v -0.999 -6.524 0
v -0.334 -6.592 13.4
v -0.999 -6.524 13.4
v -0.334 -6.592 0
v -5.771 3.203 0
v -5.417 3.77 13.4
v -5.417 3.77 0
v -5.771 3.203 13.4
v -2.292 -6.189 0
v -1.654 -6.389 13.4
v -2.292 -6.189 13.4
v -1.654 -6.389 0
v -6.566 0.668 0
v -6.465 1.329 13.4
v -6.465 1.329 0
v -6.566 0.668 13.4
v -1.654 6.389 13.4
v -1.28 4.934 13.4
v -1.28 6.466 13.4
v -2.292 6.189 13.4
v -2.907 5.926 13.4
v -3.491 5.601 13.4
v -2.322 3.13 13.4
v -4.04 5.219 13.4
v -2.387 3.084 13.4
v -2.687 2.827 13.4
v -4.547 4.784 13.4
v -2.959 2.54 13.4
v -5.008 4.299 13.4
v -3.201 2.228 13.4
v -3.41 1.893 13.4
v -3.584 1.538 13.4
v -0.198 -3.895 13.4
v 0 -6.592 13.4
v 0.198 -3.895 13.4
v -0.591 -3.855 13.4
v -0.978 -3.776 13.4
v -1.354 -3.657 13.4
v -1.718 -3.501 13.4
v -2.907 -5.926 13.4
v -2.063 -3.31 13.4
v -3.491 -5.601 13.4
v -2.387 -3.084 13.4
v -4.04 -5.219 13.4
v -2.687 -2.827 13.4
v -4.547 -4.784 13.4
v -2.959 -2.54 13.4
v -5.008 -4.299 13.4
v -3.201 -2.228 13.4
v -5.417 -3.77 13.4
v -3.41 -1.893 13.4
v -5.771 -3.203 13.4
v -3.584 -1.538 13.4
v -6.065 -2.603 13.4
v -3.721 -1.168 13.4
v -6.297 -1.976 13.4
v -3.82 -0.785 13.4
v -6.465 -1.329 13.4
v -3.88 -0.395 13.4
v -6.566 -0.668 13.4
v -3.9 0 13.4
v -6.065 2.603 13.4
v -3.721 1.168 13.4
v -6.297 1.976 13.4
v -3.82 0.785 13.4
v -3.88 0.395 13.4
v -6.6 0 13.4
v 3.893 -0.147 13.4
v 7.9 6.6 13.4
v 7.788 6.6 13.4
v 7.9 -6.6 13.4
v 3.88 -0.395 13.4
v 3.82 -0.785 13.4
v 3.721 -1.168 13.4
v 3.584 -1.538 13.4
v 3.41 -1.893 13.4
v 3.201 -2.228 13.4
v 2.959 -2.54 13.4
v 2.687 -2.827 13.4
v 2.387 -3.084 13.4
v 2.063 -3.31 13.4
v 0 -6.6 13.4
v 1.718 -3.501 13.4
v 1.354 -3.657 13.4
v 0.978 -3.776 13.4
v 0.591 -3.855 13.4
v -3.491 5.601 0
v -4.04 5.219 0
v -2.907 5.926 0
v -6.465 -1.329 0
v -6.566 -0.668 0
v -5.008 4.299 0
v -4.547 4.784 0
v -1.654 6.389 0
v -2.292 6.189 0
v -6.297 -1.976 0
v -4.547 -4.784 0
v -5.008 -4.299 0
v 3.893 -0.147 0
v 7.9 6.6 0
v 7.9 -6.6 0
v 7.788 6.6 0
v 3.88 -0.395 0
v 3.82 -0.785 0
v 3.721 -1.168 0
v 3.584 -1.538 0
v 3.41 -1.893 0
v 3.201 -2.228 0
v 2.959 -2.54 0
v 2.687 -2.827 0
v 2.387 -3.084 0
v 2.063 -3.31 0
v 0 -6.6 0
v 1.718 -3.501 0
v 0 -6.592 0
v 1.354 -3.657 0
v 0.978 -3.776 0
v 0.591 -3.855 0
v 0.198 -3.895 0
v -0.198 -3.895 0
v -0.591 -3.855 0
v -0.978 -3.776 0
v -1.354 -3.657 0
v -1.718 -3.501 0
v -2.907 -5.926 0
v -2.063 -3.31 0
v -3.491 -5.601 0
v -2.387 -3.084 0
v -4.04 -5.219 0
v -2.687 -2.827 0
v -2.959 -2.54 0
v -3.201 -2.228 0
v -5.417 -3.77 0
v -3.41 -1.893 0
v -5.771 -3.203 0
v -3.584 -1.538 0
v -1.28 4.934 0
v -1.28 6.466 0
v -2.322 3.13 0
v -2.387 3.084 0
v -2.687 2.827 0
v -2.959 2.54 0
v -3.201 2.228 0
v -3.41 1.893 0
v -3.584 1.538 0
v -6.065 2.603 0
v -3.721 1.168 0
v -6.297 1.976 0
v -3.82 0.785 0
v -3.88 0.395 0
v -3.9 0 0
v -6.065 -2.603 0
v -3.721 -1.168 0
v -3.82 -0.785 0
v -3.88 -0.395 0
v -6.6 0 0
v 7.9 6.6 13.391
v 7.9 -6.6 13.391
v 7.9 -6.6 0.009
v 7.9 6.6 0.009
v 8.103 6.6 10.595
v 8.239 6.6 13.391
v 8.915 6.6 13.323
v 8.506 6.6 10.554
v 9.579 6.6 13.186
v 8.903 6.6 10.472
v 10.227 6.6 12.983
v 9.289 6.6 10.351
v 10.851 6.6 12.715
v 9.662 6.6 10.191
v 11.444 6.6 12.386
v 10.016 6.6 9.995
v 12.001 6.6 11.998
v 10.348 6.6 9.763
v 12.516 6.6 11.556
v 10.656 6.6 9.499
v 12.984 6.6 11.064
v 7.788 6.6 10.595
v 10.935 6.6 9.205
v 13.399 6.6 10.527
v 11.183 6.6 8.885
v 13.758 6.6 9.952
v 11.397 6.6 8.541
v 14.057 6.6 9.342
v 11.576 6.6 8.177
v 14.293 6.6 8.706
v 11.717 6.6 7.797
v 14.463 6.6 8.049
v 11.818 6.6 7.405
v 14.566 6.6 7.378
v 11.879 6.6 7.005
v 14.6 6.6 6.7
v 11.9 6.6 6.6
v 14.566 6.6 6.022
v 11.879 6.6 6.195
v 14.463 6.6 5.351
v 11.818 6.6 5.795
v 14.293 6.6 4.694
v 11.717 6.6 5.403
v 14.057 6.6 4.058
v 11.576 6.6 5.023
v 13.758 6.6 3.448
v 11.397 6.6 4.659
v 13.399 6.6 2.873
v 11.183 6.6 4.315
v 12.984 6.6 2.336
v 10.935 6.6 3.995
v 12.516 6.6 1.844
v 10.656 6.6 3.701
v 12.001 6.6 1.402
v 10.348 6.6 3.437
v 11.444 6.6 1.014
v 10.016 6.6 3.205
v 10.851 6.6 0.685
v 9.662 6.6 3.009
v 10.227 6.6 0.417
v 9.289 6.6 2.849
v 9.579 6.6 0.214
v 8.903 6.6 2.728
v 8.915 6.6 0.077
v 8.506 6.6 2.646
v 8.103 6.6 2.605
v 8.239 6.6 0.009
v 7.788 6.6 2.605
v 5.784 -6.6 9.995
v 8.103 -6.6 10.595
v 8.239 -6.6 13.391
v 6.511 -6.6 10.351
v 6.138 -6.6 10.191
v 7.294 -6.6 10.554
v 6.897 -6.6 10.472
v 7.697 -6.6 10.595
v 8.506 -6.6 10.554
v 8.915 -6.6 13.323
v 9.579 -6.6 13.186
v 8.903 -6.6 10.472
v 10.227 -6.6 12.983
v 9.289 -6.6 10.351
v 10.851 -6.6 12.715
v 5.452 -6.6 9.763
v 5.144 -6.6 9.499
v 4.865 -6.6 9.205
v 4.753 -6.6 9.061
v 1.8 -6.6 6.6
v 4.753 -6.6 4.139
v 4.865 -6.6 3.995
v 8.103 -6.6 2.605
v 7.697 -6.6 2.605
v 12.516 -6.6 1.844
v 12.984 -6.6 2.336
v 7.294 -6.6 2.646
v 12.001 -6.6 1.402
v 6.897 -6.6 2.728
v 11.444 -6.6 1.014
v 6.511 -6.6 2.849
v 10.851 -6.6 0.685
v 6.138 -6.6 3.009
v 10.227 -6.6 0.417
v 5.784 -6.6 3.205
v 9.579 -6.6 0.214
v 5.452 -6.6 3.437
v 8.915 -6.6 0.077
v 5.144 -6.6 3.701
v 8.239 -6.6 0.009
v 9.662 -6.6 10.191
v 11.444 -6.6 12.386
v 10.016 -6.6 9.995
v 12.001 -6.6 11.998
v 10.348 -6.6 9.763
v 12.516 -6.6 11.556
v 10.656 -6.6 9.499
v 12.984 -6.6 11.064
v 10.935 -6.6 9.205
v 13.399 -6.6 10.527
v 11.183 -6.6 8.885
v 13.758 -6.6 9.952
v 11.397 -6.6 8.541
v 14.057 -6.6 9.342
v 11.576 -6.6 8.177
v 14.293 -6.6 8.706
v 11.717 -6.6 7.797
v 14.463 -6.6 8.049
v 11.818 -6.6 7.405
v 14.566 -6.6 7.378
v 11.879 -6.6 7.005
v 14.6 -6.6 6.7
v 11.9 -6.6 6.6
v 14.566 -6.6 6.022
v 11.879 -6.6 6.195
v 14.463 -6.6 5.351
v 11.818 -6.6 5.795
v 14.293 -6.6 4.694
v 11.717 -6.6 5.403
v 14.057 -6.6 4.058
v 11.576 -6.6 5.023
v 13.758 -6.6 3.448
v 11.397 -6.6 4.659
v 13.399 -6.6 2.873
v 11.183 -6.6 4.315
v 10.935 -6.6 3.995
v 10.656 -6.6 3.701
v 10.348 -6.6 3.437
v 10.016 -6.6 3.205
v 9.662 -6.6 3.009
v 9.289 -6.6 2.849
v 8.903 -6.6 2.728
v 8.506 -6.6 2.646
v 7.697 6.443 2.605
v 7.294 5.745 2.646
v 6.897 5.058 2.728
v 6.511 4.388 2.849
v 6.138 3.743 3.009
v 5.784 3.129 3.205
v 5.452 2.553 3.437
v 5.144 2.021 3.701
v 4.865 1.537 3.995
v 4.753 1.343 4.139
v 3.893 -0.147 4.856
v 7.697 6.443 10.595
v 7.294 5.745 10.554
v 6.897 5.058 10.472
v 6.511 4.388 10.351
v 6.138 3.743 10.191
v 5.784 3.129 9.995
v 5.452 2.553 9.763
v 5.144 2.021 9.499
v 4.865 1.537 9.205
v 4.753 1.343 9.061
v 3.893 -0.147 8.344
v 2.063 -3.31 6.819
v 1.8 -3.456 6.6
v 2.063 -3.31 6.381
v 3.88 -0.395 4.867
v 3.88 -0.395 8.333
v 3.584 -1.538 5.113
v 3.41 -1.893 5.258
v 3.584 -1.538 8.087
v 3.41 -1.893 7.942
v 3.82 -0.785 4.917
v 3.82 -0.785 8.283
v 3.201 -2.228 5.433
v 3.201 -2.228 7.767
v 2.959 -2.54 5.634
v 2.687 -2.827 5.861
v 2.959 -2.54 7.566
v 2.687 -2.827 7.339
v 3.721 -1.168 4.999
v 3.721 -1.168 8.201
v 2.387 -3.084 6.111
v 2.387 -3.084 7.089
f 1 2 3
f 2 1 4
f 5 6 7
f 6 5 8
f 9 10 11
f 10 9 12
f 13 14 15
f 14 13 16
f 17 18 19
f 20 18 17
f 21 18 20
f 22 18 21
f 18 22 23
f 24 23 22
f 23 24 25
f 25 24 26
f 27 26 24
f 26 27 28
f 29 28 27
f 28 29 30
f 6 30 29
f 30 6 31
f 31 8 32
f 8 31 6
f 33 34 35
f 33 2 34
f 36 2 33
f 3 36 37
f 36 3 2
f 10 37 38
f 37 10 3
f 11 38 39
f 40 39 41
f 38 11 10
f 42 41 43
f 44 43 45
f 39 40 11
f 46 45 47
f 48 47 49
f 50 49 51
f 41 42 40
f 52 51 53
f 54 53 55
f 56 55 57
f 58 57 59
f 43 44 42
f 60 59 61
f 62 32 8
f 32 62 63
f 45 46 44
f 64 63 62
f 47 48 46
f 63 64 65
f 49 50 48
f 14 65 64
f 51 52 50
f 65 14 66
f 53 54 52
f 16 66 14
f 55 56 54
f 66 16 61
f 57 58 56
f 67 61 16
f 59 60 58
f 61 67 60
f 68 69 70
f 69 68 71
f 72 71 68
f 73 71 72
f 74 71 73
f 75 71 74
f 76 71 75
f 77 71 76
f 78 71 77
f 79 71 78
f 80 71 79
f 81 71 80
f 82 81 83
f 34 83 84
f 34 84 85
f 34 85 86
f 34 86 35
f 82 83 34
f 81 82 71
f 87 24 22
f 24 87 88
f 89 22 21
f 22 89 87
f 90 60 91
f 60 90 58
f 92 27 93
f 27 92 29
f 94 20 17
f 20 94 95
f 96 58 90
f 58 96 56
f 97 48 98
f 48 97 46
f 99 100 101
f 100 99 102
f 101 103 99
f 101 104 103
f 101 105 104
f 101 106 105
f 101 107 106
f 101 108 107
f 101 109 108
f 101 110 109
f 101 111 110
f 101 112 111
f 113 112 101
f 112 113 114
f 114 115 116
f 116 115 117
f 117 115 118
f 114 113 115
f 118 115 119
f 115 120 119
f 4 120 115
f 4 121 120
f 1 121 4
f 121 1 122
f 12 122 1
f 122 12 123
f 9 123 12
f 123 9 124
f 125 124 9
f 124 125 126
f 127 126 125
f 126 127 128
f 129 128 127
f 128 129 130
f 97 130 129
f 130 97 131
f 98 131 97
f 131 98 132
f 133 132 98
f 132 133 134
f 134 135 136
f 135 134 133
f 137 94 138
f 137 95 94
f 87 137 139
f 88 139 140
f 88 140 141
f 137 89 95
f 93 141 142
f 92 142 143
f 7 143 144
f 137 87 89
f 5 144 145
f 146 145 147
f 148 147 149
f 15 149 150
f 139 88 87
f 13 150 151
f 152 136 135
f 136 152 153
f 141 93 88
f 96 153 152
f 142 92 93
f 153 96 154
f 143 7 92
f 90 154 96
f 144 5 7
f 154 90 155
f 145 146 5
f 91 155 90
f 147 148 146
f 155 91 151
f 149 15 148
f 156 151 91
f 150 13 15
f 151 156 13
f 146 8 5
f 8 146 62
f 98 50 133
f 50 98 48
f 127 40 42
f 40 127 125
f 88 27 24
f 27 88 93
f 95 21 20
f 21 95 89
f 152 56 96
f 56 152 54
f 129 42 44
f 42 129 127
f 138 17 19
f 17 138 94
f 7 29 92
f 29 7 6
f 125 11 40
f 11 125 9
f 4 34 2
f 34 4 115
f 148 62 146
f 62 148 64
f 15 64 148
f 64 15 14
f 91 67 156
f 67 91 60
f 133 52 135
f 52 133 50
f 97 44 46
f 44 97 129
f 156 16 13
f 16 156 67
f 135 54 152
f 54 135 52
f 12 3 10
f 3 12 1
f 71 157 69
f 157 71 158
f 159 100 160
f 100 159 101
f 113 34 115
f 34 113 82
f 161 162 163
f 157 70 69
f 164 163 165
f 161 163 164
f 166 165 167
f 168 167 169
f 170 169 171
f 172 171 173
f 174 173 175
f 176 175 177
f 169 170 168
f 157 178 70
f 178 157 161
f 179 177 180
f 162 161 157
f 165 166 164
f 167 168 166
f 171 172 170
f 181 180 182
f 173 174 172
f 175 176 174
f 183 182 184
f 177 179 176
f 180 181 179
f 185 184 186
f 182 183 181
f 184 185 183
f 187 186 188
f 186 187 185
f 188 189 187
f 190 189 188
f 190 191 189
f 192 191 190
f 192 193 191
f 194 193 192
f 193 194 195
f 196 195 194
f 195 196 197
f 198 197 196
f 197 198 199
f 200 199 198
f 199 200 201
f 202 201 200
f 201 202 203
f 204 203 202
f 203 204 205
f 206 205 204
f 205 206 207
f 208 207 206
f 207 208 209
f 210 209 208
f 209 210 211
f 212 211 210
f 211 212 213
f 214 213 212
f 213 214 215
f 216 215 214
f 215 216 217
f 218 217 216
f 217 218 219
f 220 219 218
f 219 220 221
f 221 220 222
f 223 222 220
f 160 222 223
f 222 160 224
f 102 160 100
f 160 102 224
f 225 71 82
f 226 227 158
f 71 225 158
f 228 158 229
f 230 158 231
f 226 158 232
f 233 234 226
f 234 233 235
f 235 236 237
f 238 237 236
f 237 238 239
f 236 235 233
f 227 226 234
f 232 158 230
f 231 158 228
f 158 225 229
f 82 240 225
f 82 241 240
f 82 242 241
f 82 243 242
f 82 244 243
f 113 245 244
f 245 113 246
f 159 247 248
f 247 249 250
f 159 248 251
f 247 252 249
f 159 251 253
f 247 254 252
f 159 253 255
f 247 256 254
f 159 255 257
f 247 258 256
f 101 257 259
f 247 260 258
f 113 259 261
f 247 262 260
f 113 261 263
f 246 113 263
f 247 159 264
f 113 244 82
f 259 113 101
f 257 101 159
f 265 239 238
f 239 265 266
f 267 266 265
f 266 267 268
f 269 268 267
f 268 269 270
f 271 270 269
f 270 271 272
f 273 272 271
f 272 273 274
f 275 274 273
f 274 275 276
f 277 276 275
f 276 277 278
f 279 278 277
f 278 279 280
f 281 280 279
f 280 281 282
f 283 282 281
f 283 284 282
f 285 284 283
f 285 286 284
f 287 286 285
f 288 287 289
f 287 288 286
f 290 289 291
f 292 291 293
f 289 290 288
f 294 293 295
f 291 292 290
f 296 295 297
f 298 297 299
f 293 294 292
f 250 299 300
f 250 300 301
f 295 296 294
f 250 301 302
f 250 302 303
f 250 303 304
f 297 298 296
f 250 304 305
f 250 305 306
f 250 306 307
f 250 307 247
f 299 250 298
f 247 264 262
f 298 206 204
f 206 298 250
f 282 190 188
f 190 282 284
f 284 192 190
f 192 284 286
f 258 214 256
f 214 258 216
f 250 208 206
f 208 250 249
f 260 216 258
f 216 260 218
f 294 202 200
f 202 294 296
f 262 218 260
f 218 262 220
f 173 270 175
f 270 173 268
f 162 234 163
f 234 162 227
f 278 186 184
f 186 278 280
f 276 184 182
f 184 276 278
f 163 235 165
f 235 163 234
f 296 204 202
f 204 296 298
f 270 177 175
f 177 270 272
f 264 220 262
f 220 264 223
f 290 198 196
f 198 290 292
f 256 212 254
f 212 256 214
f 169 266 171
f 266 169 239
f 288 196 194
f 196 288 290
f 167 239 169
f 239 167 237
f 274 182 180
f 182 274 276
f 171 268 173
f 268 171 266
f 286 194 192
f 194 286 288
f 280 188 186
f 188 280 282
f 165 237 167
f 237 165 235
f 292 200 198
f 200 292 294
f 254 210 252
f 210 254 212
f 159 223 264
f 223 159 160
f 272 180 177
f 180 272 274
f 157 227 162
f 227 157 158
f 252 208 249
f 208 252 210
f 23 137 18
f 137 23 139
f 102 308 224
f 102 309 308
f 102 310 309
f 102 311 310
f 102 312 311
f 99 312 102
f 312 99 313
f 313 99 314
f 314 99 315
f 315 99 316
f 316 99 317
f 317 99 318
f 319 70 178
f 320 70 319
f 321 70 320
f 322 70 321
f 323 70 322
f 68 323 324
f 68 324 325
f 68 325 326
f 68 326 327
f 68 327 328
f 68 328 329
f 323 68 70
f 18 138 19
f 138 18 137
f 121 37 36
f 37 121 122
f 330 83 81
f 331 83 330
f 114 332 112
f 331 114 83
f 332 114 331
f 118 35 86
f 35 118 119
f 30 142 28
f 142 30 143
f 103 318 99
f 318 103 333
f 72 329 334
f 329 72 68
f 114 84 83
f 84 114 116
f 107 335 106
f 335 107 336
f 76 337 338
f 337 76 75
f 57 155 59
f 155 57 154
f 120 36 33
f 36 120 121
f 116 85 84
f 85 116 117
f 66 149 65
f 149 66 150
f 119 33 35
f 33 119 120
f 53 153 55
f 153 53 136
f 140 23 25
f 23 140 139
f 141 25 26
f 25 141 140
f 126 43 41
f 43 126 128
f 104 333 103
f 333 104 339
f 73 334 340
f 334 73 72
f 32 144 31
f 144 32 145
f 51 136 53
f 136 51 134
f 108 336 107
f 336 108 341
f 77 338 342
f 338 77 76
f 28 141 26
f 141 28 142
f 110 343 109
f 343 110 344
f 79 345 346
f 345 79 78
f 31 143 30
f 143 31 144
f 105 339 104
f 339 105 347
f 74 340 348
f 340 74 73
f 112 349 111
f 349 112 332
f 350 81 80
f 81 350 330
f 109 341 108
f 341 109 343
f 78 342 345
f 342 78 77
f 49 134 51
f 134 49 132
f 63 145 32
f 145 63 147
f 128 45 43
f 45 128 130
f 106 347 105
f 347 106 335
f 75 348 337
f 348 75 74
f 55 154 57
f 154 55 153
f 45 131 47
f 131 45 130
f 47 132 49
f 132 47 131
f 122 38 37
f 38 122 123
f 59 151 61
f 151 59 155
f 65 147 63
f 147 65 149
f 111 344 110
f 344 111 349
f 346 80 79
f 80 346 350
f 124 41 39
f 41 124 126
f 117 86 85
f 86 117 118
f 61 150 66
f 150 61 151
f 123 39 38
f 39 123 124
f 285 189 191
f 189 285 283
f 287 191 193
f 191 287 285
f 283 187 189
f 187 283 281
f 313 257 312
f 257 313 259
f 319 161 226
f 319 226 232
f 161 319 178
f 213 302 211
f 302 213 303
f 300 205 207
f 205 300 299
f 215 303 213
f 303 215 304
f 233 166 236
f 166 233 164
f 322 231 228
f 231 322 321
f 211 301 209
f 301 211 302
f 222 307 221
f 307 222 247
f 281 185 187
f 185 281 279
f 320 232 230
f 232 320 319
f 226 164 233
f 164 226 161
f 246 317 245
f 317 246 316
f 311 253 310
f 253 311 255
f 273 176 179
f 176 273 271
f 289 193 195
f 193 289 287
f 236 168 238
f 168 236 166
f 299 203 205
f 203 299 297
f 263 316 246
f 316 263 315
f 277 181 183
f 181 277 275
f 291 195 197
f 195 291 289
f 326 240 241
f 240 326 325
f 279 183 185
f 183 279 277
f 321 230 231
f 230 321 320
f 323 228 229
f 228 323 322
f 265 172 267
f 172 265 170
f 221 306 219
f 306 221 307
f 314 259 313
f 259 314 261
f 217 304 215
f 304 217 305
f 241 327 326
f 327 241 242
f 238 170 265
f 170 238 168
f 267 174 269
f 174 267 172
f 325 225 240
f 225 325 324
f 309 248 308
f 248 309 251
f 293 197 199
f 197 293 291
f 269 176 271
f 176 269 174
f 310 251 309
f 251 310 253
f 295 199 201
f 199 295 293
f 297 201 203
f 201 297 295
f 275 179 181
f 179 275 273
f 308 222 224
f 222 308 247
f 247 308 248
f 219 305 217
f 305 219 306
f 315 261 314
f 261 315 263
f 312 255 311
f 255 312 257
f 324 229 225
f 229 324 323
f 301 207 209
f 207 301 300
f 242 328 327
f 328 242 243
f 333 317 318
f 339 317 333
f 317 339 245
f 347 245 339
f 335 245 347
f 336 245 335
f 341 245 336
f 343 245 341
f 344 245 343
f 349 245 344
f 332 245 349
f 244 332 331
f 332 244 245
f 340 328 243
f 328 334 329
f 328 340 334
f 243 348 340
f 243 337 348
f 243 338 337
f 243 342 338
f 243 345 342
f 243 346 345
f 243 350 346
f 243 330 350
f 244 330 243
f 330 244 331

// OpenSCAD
/*
 * New Y Clamp
 *
 * (C) Michel Pollet <buserror@gmail.com>
 *
 * This clamp is made to replace the existing prusa ones; the prusa ones have a tendency to break,
 * and they also make positioning the Y smooth rods very difficult as the rod moves when you turn
 * the M8 nuts on each side. Also, when you break one, you need to disassemble the whole frame to
 * replace it.
 *
 * This one is made to be a bit squat, the 2 rods are in contact with each others so there is no
 * plastic to flex. You can also clip it directly on the rod without disassembling the frame, and
 * once the smooth rod is in, it prevents any unclipping. It also allows you to position the clamp
 * secure one end, and tighened the other with negligeable rod movement.
 *
 * To print, make sure your slicer makes the walls "solid" otherwise it might flex too much. It's
 * also a good idea to print a set of 4, or print slowly to make sure the "bridge" and overhang
 * print nicely..
 *
 * This part is not for commercial distribution without a commercial license acquired from the
 * author. Distribution on a small scale basis (< 50 units) in the Reprap spirit is free of
 * charge on the basis of mentioning the Author with the bill of material, any wider
 * distribution requires my explicit, written permission.
 */
$fn = 62;

// for 0.20mm layer, 0.35mm nozzle 00 this ensures "solid walls"
shell = 2.7;
m8rod = 7.80 / 2;
m8smooth = 8.0 / 2;

smoothwidth = (m8smooth + shell) * 2;
rodW = (m8rod + shell) * 2;

demo=0;
four=0;

if (four==0) {
	rotate(demo == 1 ? [0,90,0] : [0,0,0])
	clamp(demo=demo);
} else {
	for (row = [0:1]) for (col = [0:1]) {
		translate([row * 25, col * 15, 0])
			clamp();
	}
}

module clamp(demo=0) difference() {
	union() {
		cylinder(r = m8rod + shell, h = smoothwidth);
		translate([0, -(m8rod + shell), 0])
			cube(size=[m8rod + m8smooth, rodW, smoothwidth]);
		translate([m8rod + m8smooth, rodW / 2, smoothwidth / 2])
			rotate([90,0,0])
				cylinder(r = m8smooth + shell, h = rodW);
	}

	if (demo==1) % union() {
		assign(WasherR = 16/2,
			WasherH = 1.6,
			NutH = 6.5,
			NutD = 13) {
		translate([0,0,-15])
			cylinder(r = m8rod, h = smoothwidth + 30);
		translate([0,0,-WasherH])
			cylinder(r = WasherR, h = WasherH);
		translate([0,0,-WasherH-NutH])
			nut(d = NutD, h = NutH, horizontal=false);
		}
	}	
	translate([0,0,-1])
		cylinder(r = m8rod, h = smoothwidth + 2);	
	translate([m8rod + m8smooth, (rodW / 2) + 1, rodW / 2])
		rotate([90,0,0]) {
				cylinder(r = m8smooth, h = rodW + 2);
			if (demo==1) translate([0,0,-8])
				% cylinder(r=m8smooth, h =30);
		}

	translate([m8rod -0.5, -1, -1]) {
		rotate([0,0,60])
			cube(size=[rodW, m8rod * 1.8, rodW + 2]);
		rotate([0,0,90])
			cube(size=[rodW, m8rod * 1.2, rodW + 2]);
	}

	translate([m8rod,-m8rod,m8smooth+shell-0.1]) rotate([90,0,0]) scale(0.7)
      linear_extrude( height = 30, center = true)
            polygon(points = [[3.00,-5.00],[3.00,5.00],[-3.00,0.00]], paths = [[0,1,2]]);
}

/*
 * This is used only for demo screenshots, and thus
 * does not infect the main code
 */
// PRUSA Mendel  
// Functions used in many files
// GNU GPL v3
// Josef Průša
// josefprusa@me.com
// prusadjs.cz
// http://www.reprap.org/wiki/Prusa_Mendel
// http://github.com/prusajr/PrusaMendel


module nut(d,h,horizontal=true){
cornerdiameter =  (d / 2) / cos (180 / 6);
cylinder(h = h, r = cornerdiameter, $fn = 6);
if(horizontal){
for(i = [1:6]){
	rotate([0,0,60*i]) translate([-cornerdiameter-0.2,0,0]) rotate([0,0,-45]) cube(size = [2,2,h]);
}}
}
